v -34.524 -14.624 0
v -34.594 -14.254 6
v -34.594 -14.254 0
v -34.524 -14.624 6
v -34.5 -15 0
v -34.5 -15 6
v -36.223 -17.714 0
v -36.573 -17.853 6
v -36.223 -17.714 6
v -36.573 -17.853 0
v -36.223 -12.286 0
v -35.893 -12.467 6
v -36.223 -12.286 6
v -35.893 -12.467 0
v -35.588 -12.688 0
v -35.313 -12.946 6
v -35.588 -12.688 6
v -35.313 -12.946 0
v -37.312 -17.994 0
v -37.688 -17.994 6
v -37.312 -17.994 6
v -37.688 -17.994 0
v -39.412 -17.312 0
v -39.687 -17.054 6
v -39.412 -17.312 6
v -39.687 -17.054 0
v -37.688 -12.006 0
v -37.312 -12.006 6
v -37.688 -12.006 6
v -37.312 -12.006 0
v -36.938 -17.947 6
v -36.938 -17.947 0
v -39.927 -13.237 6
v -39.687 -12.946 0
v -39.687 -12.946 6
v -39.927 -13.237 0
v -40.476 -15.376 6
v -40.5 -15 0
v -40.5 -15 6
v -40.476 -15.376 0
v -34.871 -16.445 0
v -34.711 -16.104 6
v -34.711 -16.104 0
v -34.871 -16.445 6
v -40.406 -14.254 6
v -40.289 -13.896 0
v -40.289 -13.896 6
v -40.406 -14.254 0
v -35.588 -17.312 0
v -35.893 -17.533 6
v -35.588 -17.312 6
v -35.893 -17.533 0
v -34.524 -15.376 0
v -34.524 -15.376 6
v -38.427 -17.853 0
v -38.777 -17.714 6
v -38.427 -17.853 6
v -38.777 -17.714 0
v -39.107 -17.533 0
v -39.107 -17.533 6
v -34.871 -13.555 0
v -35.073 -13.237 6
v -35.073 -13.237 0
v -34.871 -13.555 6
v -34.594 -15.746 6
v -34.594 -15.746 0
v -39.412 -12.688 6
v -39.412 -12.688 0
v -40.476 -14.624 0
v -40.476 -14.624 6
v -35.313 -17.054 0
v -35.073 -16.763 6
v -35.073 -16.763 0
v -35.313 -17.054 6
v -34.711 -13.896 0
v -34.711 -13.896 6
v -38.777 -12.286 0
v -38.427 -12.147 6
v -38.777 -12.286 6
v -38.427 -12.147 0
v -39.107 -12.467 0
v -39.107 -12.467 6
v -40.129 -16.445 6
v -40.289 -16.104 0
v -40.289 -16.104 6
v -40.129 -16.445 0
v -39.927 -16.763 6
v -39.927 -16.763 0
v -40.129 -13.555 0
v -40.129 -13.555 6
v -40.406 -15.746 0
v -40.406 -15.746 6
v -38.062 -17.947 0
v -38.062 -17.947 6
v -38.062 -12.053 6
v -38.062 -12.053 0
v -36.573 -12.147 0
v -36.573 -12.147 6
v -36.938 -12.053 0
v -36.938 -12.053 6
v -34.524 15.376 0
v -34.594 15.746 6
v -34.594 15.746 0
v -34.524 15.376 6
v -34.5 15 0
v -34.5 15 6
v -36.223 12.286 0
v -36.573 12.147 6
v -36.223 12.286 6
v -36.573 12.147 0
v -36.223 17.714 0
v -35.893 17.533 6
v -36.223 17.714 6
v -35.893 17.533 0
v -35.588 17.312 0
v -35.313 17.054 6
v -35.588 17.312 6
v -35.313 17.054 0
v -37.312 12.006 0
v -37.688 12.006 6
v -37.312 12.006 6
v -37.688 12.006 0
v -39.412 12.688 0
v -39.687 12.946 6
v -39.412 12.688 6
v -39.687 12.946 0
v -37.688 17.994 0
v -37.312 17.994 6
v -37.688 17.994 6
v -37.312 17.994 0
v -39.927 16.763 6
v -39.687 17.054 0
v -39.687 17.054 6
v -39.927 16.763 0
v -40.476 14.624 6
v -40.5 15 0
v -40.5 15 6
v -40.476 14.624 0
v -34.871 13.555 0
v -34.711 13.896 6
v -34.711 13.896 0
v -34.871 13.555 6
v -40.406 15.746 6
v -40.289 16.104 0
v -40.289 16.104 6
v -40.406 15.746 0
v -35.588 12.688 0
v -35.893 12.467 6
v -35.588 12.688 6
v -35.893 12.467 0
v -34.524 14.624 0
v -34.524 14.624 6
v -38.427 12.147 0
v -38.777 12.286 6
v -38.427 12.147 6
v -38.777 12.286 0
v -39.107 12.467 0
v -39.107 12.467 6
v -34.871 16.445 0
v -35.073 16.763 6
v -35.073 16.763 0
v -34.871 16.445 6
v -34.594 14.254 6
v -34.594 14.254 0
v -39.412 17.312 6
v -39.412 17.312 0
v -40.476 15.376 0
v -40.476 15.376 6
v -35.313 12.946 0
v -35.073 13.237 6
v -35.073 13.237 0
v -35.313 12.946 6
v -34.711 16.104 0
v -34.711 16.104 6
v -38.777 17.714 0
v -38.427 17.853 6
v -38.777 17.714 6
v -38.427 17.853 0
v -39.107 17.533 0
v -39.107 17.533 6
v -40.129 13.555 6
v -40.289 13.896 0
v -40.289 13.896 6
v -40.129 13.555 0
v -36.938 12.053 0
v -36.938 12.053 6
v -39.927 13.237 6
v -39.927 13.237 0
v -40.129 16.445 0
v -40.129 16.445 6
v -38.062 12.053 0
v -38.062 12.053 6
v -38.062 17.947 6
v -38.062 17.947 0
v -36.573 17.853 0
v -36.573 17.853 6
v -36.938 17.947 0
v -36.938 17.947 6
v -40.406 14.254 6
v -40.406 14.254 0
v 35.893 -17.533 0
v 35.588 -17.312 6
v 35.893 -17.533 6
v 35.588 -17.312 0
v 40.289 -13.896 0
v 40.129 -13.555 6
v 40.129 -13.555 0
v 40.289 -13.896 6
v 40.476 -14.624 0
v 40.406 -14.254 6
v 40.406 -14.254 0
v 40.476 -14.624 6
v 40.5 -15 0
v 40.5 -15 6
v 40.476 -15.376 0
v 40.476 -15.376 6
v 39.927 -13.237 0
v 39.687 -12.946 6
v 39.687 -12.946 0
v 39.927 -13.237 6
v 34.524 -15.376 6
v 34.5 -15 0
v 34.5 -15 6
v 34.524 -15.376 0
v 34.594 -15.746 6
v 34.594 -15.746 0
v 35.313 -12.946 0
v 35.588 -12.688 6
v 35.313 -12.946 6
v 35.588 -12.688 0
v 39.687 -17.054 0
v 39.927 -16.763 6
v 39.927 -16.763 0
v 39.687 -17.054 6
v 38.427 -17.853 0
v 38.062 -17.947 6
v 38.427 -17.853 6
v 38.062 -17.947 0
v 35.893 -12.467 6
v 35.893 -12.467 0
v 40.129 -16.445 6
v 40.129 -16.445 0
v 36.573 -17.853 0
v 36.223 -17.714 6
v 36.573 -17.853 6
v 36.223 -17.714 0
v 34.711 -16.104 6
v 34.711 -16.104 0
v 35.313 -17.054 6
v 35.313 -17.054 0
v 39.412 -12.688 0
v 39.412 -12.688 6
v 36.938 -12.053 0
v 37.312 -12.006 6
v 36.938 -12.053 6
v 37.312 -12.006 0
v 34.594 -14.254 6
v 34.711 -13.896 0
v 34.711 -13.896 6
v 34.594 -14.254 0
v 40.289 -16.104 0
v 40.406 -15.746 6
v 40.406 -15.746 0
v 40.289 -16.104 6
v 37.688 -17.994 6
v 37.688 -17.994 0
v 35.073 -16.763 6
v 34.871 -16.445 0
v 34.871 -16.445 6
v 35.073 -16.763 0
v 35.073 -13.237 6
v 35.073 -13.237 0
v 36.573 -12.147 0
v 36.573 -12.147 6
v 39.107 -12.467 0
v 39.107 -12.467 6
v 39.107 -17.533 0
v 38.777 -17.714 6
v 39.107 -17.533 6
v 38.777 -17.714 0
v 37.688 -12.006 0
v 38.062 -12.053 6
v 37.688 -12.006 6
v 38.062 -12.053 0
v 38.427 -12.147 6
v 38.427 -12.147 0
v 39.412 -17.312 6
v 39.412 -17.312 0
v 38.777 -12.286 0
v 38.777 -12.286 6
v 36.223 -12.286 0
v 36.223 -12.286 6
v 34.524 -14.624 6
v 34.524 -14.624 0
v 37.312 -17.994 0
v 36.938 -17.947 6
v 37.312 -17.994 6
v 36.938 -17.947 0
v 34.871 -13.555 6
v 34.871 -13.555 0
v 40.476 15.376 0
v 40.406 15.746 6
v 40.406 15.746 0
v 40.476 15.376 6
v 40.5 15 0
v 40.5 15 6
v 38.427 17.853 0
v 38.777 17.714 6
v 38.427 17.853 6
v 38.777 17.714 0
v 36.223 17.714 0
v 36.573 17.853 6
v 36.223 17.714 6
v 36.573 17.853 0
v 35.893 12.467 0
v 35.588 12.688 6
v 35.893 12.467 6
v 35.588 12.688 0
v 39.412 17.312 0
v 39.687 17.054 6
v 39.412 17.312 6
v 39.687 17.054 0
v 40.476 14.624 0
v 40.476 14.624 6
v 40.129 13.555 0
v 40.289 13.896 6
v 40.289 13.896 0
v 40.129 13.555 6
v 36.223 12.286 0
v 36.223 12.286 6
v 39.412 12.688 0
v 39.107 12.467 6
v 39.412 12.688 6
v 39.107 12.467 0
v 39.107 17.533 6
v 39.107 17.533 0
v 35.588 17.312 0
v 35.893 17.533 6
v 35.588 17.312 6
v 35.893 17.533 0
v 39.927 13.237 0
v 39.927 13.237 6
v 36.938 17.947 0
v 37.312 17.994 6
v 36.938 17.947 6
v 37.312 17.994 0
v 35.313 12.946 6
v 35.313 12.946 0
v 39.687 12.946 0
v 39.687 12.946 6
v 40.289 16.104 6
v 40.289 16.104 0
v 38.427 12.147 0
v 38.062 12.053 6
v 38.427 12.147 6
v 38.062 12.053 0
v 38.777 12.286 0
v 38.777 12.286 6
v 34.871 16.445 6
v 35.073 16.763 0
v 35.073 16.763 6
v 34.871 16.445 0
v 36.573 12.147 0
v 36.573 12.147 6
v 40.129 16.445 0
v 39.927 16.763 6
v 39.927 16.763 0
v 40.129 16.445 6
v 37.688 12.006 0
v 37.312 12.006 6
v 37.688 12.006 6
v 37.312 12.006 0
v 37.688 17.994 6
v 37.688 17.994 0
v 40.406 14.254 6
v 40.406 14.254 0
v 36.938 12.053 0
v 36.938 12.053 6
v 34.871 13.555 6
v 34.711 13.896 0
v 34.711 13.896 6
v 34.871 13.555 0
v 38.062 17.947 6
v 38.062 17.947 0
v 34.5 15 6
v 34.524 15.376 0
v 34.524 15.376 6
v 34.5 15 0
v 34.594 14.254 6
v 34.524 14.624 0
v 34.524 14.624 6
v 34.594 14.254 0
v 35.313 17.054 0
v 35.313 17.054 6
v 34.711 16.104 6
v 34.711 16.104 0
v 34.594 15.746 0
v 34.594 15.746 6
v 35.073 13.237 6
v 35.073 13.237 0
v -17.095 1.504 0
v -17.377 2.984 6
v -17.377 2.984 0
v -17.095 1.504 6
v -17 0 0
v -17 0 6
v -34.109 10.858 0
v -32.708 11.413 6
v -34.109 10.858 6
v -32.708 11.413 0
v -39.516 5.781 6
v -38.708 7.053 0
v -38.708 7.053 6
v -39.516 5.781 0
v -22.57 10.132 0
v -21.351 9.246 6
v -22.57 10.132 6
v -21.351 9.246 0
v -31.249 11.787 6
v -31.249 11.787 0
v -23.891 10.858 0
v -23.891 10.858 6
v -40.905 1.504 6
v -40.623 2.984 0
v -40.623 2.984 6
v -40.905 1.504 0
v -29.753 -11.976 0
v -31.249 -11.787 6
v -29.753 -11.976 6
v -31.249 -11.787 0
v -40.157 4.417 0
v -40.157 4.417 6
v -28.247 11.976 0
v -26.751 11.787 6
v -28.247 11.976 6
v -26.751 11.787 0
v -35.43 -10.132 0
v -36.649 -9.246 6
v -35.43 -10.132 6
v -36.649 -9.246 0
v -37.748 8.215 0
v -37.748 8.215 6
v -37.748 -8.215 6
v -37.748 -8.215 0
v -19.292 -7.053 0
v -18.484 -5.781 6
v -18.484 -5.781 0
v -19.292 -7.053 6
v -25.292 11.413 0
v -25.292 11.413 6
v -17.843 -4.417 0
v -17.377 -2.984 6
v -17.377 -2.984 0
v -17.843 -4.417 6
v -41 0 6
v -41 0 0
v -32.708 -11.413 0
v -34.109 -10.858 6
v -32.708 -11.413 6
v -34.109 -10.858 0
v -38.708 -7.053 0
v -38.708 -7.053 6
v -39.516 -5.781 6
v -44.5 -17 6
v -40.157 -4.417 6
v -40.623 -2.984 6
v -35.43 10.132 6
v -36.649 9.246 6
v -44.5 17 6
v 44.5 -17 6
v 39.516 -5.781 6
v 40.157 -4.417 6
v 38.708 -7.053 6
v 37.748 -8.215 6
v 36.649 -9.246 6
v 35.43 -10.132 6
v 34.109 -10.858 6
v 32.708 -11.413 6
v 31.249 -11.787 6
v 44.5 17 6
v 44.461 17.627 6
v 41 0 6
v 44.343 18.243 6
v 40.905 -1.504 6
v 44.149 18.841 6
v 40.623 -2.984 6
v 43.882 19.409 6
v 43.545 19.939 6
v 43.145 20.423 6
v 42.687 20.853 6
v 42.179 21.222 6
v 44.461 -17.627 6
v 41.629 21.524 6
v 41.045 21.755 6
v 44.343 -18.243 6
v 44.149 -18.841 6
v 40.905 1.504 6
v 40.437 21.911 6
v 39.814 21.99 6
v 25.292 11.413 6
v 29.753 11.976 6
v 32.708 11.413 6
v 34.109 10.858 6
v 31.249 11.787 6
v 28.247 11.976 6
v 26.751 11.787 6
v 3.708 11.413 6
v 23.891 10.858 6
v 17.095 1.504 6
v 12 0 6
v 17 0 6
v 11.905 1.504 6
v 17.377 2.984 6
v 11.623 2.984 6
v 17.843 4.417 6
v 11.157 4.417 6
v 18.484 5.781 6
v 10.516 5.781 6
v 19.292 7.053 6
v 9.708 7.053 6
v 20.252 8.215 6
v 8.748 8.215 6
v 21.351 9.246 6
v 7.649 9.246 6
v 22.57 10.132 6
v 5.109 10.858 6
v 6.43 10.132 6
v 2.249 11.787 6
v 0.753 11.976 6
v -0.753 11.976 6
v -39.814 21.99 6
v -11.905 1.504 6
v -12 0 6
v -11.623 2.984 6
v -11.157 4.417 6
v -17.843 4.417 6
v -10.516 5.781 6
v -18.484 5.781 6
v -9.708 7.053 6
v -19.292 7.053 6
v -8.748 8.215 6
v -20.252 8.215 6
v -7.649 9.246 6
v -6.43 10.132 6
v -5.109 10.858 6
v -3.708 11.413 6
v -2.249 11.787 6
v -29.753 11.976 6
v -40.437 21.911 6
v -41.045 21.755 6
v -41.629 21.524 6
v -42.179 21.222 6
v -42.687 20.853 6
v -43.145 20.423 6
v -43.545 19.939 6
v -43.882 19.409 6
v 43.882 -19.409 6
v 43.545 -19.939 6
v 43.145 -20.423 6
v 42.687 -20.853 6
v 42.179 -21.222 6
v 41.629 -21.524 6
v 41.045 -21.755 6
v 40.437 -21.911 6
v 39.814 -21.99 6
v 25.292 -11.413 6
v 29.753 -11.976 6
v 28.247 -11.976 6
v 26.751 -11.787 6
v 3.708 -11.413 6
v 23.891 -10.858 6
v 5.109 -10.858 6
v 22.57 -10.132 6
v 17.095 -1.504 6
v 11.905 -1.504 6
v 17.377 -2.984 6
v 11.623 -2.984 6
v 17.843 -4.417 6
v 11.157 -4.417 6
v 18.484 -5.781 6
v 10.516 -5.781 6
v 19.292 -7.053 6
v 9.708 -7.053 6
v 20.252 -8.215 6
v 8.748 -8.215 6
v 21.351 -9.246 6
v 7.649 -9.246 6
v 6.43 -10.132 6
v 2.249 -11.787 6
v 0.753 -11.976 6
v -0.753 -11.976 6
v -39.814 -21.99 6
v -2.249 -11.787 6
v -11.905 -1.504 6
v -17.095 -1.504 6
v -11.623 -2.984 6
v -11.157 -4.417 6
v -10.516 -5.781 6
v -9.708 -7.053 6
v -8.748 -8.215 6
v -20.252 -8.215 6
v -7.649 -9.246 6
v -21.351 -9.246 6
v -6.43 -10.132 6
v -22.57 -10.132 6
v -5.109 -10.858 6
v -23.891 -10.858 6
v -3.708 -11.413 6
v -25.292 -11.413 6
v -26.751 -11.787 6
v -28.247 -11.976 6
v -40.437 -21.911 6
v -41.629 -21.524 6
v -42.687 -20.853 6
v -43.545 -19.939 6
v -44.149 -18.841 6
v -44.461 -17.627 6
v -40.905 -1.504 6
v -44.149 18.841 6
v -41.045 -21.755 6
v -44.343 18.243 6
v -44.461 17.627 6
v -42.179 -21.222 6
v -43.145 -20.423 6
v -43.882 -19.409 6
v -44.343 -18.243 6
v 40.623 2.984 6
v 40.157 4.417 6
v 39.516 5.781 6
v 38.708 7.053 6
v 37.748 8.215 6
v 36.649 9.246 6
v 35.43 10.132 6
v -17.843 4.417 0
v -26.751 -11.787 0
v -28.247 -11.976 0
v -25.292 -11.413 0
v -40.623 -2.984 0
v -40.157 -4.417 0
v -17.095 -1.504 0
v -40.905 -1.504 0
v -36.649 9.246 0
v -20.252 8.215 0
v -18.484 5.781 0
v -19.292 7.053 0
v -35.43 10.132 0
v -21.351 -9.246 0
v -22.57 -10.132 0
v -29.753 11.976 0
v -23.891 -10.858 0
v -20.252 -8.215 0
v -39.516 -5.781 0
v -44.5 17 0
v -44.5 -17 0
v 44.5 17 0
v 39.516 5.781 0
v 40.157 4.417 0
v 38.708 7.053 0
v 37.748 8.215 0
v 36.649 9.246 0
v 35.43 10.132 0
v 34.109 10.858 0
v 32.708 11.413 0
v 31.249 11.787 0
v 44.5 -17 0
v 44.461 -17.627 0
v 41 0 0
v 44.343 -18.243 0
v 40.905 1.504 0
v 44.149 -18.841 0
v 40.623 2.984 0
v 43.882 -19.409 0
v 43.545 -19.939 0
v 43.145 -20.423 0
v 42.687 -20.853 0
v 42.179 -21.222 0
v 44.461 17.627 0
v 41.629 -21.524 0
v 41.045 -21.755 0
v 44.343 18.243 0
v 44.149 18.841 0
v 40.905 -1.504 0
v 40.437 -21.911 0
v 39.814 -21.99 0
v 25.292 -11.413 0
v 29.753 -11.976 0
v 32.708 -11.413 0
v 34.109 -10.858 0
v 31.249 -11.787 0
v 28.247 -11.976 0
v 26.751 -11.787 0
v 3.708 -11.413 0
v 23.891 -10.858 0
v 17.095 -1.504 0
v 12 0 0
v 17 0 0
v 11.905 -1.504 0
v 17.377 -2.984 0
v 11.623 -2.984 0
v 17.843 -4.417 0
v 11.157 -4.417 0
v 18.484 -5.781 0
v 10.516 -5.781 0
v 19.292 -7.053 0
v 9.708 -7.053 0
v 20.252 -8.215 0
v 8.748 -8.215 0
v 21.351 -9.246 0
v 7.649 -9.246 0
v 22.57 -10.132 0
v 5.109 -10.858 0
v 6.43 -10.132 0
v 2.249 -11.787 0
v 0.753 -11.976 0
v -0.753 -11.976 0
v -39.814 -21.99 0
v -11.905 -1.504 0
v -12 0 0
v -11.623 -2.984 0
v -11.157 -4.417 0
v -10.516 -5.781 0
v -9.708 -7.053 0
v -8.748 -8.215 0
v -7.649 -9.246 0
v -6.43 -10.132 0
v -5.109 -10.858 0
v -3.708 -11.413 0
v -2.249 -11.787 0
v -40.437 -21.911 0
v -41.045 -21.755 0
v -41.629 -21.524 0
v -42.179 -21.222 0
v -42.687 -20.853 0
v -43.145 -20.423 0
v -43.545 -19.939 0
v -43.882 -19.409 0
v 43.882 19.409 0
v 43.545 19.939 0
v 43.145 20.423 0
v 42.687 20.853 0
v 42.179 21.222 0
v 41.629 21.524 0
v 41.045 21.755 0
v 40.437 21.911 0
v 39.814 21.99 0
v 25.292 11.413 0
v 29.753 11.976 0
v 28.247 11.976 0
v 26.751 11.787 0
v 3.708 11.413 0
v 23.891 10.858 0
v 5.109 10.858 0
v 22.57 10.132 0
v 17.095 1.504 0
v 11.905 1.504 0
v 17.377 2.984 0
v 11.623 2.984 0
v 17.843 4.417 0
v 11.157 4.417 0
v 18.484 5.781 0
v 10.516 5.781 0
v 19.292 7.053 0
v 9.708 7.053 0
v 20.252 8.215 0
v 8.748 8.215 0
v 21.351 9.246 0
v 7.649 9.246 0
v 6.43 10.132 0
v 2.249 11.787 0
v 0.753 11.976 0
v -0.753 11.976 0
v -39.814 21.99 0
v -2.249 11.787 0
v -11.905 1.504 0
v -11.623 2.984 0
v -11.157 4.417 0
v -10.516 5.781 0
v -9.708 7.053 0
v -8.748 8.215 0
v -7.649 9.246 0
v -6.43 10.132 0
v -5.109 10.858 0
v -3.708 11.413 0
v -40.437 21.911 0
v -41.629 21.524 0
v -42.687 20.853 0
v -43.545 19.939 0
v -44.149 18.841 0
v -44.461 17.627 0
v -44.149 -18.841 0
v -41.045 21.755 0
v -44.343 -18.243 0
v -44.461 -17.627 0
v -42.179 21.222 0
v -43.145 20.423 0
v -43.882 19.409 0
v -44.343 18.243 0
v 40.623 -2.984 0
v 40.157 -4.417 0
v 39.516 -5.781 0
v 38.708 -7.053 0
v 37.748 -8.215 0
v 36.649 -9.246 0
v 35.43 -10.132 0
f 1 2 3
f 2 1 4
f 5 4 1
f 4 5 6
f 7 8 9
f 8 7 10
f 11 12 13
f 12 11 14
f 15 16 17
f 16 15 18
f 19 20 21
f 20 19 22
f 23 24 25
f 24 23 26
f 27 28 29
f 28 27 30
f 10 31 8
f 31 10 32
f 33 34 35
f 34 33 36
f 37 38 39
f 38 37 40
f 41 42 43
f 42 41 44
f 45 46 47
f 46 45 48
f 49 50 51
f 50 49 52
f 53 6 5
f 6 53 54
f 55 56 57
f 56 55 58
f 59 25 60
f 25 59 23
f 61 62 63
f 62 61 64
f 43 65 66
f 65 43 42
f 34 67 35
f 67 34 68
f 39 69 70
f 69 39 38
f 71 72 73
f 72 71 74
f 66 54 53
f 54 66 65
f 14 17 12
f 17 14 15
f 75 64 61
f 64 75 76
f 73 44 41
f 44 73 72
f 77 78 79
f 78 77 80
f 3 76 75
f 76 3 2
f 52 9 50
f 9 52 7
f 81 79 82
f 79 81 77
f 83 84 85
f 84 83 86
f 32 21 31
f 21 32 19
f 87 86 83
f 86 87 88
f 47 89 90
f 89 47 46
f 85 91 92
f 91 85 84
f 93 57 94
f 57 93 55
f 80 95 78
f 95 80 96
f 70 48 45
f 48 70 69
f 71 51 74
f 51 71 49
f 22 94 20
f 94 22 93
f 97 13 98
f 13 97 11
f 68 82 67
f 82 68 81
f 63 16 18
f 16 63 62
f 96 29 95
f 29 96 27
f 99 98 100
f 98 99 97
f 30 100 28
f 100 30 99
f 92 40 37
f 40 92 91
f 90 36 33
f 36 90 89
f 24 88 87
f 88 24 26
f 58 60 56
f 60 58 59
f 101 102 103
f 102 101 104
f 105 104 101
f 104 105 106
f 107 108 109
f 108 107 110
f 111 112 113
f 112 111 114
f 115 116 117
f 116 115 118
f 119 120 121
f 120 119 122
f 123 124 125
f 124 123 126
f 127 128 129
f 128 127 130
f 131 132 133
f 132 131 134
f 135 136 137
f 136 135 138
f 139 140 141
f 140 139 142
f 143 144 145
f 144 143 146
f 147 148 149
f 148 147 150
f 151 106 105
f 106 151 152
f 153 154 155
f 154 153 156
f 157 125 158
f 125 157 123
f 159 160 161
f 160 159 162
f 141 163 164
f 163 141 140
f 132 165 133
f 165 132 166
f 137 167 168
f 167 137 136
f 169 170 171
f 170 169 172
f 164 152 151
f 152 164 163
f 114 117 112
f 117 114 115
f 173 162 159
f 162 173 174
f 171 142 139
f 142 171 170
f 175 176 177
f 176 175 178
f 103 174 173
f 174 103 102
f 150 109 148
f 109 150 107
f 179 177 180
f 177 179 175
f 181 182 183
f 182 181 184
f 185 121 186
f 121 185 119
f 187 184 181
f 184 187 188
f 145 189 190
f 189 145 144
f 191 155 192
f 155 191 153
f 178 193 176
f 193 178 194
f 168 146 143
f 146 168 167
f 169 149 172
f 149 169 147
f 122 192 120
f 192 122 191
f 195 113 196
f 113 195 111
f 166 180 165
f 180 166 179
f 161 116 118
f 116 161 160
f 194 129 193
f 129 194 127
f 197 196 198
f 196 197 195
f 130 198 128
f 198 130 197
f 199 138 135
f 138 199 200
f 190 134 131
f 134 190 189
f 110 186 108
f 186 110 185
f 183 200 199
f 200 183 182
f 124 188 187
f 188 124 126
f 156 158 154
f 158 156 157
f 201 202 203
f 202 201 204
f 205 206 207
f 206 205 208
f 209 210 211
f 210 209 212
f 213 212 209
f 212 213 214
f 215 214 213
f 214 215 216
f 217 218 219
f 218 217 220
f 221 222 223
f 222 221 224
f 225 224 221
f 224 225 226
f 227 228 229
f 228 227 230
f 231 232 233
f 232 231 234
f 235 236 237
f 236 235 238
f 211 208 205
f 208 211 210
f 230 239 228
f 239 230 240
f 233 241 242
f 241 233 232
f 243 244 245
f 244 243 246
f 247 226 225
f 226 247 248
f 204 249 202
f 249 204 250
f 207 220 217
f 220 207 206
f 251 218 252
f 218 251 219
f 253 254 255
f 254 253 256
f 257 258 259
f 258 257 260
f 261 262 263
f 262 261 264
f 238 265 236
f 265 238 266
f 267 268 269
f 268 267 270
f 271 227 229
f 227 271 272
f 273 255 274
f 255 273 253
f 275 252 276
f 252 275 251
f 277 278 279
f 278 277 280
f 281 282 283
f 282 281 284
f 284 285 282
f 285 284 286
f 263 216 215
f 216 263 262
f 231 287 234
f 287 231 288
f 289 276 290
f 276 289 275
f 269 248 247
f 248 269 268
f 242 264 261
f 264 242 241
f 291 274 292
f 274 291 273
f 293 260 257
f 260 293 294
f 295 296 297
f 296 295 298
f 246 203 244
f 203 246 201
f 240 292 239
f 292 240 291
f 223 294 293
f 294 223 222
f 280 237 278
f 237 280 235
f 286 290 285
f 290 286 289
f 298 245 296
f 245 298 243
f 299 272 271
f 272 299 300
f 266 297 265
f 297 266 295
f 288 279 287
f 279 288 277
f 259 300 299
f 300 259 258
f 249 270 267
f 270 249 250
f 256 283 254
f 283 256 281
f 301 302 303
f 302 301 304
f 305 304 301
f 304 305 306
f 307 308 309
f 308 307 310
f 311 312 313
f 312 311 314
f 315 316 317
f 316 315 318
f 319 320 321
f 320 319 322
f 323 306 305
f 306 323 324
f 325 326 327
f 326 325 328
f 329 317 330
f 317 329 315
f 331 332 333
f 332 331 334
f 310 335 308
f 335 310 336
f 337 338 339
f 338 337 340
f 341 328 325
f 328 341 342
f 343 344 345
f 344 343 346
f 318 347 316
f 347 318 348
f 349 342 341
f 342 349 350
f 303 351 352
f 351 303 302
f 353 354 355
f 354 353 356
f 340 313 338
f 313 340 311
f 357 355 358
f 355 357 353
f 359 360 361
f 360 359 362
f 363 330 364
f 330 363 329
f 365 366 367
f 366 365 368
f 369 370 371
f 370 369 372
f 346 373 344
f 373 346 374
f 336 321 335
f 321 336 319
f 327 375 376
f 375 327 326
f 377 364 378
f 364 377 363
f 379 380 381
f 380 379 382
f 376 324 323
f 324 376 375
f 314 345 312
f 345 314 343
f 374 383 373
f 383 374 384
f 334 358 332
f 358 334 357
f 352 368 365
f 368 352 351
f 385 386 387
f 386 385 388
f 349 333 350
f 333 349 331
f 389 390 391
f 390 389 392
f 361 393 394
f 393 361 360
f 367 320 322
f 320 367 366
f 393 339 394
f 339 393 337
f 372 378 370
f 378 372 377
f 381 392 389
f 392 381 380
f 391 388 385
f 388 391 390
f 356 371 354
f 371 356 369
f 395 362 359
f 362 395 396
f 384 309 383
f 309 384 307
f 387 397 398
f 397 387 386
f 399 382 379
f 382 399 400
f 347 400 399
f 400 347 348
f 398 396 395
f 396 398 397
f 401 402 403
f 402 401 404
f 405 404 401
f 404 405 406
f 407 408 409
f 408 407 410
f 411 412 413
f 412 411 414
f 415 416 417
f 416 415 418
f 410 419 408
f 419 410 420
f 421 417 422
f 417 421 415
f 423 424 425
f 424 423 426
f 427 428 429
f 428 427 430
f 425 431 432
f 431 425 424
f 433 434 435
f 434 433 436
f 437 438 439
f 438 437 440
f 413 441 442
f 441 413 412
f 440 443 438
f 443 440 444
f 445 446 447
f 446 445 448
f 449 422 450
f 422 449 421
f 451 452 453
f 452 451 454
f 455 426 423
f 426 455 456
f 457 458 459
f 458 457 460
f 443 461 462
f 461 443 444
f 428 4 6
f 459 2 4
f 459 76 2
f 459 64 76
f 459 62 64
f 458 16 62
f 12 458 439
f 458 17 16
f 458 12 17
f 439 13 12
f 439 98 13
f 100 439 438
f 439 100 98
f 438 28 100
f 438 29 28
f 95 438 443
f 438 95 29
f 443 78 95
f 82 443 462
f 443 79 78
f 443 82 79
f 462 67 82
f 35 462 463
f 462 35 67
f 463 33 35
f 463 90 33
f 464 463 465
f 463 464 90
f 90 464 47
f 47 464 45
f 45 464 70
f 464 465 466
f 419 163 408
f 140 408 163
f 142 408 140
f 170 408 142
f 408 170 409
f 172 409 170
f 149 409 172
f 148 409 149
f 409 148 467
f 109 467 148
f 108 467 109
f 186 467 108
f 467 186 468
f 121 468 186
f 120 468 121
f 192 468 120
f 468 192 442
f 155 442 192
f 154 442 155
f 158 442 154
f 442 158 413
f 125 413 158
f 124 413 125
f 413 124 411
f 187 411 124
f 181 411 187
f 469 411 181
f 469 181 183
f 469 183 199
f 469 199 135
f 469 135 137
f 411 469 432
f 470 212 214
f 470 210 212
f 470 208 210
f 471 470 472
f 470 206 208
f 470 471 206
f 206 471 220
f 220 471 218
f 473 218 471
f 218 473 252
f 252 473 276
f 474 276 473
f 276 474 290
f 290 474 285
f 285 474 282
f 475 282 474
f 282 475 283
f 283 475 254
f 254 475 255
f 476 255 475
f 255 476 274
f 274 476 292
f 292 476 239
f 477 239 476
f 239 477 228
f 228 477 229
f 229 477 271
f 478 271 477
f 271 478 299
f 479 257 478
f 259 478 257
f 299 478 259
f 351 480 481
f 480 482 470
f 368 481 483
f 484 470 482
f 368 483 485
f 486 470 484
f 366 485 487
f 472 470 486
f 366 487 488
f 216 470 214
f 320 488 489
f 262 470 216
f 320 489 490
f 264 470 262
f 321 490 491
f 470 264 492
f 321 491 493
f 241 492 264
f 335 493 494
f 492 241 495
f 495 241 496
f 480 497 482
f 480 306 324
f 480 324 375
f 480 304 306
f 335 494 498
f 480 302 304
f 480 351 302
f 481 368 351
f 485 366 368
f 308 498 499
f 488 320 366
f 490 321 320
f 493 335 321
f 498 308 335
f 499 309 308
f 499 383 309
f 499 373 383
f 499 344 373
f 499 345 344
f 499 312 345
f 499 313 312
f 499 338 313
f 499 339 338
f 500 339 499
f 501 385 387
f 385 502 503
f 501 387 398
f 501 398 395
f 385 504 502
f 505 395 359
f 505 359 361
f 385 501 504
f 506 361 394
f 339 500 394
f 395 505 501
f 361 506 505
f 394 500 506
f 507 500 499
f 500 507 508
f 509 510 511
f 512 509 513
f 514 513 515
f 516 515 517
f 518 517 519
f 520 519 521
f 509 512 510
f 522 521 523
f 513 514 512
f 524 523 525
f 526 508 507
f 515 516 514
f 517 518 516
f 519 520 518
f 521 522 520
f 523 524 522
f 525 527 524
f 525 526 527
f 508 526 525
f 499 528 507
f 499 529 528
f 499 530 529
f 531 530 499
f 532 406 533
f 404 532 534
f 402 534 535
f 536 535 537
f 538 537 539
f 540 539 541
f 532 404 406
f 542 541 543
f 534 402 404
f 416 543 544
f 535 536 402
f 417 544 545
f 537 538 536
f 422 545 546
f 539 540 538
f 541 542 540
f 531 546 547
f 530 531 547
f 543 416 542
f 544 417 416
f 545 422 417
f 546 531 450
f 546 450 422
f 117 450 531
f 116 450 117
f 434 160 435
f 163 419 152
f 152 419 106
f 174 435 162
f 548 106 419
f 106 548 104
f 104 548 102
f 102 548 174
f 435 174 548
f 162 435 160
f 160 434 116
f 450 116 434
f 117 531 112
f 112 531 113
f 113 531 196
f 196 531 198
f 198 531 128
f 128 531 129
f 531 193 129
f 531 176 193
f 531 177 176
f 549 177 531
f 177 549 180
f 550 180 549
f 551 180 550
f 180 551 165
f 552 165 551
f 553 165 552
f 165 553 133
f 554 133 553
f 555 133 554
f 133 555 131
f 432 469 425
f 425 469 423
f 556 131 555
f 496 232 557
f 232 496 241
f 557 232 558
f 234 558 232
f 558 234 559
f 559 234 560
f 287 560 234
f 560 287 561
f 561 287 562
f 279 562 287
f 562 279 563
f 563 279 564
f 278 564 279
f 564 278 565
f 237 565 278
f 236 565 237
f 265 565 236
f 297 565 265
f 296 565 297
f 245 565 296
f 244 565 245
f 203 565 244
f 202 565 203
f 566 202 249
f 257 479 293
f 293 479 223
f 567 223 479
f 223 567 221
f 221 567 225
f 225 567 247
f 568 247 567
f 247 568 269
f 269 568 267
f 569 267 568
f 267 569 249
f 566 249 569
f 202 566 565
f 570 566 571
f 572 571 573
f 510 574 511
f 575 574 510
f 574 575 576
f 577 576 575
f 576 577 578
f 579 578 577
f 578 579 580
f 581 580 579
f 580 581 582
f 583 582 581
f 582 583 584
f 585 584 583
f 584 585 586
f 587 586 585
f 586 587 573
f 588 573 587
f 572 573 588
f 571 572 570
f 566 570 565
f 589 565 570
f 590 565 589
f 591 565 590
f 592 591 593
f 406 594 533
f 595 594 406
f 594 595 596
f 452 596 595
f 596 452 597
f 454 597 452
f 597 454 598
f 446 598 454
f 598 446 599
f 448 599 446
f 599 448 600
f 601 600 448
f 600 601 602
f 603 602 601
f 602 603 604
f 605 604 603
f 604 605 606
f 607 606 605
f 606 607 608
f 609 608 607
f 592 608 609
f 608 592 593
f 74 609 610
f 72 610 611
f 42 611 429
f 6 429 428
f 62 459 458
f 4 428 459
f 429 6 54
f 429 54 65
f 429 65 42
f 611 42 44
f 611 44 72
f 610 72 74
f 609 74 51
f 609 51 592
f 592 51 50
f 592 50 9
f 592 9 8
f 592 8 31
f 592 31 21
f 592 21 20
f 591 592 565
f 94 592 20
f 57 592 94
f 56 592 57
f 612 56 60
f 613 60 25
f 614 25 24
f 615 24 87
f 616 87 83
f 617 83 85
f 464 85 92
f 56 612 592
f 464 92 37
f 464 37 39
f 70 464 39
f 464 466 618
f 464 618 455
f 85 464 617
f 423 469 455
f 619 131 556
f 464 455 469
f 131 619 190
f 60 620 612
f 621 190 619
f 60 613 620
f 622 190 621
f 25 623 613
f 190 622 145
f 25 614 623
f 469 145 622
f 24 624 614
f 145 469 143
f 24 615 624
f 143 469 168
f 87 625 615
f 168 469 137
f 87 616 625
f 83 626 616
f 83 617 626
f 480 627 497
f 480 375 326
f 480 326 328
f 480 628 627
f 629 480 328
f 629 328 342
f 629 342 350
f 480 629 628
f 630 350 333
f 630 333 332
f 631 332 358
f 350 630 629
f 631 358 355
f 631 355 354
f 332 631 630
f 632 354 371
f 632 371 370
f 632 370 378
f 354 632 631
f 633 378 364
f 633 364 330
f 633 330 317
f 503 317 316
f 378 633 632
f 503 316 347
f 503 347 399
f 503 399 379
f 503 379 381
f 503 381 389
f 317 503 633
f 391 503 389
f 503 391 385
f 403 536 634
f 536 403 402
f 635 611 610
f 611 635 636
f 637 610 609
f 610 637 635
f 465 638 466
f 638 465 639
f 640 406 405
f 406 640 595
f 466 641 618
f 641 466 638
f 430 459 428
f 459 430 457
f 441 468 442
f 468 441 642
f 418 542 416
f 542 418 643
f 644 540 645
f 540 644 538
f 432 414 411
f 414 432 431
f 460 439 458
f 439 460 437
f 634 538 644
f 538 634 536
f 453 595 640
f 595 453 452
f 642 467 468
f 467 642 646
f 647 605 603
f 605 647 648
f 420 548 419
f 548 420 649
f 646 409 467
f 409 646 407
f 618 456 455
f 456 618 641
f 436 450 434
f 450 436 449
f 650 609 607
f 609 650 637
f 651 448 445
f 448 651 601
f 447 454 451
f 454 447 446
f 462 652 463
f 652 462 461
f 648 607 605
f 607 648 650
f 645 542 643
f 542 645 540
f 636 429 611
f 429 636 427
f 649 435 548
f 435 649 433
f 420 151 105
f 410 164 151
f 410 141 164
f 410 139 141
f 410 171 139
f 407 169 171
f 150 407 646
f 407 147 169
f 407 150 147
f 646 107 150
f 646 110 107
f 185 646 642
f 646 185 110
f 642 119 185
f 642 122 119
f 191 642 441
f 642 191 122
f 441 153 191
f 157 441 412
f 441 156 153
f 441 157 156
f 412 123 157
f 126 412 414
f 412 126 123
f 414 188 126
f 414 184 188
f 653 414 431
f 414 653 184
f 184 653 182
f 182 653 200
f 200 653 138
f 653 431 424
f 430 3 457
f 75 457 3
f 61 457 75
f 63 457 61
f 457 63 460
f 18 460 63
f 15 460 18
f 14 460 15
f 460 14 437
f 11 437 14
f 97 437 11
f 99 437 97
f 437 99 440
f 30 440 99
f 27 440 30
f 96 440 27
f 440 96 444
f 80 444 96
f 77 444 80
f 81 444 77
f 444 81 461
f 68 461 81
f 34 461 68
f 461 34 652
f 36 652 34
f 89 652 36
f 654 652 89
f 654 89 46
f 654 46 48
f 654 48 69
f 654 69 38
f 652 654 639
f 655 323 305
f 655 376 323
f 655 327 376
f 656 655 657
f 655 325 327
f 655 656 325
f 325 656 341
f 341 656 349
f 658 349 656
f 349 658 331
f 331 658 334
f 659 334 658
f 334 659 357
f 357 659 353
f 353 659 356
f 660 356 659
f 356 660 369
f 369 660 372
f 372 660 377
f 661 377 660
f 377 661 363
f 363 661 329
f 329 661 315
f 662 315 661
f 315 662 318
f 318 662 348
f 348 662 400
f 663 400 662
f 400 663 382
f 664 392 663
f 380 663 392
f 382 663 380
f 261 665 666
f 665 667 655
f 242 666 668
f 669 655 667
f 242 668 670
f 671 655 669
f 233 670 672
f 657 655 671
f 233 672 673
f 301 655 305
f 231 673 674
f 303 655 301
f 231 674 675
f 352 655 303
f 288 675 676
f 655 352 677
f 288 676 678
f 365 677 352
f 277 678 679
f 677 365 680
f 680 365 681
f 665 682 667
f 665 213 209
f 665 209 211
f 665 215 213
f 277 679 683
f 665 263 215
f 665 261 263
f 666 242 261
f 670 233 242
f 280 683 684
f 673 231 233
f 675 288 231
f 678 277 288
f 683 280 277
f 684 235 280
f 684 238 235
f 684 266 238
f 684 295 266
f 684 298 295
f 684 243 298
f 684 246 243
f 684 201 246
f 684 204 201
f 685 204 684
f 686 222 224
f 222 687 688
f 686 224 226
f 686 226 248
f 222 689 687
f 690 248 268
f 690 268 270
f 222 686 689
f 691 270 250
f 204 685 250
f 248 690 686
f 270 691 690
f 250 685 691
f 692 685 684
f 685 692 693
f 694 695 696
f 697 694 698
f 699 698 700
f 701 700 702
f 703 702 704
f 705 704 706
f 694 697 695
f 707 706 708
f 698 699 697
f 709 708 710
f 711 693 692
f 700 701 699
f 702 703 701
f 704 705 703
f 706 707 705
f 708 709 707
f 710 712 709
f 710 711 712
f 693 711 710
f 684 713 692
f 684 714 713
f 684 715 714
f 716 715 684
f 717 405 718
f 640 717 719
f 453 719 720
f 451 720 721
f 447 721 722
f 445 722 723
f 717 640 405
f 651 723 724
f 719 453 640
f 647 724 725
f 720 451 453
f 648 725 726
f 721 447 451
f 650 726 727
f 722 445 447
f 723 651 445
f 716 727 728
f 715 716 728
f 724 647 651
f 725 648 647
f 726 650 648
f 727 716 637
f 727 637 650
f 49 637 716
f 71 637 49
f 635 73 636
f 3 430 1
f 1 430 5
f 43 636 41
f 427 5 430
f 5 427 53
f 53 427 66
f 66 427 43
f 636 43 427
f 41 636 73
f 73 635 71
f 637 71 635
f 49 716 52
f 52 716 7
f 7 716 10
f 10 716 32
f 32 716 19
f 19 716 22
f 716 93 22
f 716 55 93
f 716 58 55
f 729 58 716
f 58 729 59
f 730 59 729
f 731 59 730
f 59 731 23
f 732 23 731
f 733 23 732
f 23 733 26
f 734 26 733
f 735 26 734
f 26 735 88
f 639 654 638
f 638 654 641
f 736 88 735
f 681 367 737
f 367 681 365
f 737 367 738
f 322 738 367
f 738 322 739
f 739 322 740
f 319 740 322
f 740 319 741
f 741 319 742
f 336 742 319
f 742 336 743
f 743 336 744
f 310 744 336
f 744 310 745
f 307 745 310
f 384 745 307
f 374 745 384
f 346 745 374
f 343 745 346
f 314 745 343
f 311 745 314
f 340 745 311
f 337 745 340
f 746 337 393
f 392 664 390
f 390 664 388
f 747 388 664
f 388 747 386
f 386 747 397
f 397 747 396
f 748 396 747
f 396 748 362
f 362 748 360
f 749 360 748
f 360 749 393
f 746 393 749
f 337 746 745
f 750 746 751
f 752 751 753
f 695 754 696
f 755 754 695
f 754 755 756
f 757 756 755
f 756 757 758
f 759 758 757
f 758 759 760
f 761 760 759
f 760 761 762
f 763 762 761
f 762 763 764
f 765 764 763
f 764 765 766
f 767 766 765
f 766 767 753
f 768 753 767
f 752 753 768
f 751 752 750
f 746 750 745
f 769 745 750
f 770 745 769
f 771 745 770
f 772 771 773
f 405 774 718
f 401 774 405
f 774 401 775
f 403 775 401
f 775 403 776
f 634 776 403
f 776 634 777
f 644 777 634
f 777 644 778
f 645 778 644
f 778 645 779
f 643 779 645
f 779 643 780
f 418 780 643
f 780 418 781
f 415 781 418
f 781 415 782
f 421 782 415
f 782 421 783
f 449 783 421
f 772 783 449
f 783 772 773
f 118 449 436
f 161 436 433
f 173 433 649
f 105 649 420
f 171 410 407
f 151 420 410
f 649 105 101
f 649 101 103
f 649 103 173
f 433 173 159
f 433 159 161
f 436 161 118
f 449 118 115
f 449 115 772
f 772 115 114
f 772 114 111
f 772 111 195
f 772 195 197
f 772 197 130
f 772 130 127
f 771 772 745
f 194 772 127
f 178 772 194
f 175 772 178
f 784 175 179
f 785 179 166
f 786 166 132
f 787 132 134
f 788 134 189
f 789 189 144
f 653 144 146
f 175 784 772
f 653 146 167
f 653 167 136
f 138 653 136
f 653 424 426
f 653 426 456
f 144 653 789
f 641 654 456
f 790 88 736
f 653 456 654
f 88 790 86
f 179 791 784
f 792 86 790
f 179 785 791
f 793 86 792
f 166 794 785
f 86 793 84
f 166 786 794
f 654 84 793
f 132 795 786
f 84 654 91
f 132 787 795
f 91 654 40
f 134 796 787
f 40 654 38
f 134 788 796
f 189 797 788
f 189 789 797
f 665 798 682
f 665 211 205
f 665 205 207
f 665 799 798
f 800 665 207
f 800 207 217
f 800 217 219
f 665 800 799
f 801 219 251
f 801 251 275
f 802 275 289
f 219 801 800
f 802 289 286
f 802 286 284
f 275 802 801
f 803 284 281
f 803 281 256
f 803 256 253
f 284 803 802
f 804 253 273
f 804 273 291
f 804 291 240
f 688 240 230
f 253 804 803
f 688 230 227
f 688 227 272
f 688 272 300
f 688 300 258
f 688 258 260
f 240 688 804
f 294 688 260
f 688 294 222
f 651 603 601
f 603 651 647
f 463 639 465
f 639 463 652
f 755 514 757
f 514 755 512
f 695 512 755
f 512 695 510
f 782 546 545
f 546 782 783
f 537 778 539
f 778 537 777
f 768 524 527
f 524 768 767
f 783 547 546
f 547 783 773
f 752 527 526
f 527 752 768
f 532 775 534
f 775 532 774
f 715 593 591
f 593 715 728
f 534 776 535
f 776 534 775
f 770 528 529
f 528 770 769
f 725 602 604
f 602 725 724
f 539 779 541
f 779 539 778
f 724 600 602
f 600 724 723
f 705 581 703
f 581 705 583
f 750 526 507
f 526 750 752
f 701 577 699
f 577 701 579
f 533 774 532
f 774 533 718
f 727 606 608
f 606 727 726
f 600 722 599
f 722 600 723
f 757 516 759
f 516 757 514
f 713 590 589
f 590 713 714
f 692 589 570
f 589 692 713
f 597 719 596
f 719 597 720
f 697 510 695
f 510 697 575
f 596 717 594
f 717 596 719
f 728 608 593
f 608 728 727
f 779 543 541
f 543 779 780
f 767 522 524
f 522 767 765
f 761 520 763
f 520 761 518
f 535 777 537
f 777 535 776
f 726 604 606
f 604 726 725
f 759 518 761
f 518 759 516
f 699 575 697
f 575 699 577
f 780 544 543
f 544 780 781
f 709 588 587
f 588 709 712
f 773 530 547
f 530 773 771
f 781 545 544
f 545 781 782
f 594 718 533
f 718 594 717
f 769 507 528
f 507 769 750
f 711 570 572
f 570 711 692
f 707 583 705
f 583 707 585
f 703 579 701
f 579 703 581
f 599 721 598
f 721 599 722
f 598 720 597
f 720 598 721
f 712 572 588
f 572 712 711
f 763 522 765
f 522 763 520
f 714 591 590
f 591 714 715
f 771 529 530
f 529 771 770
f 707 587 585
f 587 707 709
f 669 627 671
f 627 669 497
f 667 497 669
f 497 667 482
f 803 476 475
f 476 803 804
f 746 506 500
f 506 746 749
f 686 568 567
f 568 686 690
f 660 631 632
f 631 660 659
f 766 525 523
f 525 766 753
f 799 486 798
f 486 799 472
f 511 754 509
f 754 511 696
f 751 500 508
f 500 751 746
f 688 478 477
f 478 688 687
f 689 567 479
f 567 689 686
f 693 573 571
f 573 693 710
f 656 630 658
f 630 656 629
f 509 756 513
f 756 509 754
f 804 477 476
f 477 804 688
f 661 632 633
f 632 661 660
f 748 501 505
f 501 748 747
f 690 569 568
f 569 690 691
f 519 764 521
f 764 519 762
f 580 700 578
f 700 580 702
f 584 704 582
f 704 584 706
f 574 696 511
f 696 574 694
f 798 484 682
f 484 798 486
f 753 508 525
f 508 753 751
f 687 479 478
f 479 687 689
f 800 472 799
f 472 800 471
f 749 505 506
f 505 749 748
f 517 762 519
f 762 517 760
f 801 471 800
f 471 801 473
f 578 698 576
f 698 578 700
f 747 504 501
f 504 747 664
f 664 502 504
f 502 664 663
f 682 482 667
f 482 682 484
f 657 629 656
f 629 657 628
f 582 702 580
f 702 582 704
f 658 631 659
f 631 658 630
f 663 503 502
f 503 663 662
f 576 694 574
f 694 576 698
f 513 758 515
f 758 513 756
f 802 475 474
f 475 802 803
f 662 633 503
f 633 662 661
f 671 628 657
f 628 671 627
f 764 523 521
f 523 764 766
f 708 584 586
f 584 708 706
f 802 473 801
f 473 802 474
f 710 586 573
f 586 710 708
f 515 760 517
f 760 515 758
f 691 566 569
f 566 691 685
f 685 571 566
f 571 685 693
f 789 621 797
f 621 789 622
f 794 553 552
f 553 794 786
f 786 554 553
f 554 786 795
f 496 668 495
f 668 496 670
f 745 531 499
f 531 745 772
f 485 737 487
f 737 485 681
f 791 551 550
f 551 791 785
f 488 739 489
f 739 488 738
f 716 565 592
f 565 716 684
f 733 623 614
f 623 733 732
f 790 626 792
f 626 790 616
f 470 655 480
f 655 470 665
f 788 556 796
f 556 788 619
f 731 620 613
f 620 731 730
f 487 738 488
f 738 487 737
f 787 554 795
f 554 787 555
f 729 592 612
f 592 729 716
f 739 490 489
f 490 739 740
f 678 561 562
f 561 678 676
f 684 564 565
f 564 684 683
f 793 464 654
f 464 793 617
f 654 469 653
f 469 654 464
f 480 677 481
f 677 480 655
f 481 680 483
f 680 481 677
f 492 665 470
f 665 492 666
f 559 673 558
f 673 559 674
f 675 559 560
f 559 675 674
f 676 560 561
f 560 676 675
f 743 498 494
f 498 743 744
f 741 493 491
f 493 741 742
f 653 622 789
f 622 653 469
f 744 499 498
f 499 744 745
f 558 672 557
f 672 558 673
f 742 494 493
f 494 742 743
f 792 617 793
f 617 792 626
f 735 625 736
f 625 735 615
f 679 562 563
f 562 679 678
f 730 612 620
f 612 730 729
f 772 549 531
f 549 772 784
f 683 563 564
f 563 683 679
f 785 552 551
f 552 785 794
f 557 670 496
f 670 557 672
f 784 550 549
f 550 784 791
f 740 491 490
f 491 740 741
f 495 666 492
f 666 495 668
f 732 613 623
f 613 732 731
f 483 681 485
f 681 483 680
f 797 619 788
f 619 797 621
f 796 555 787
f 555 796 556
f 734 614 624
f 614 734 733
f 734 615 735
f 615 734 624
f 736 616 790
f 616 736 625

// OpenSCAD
$fn = 50;


difference() {
	union() {
		hull() {
			translate(v = [-39.5000000000, 17.0000000000, 0]) {
				cylinder(h = 6, r = 5);
			}
			translate(v = [39.5000000000, 17.0000000000, 0]) {
				cylinder(h = 6, r = 5);
			}
			translate(v = [-39.5000000000, -17.0000000000, 0]) {
				cylinder(h = 6, r = 5);
			}
			translate(v = [39.5000000000, -17.0000000000, 0]) {
				cylinder(h = 6, r = 5);
			}
		}
	}
	union() {
		#translate(v = [-37.5000000000, -15.0000000000, -100.0000000000]) {
			cylinder(h = 200, r = 3.0000000000);
		}
		#translate(v = [-37.5000000000, 15.0000000000, -100.0000000000]) {
			cylinder(h = 200, r = 3.0000000000);
		}
		#translate(v = [37.5000000000, -15.0000000000, -100.0000000000]) {
			cylinder(h = 200, r = 3.0000000000);
		}
		#translate(v = [37.5000000000, 15.0000000000, -100.0000000000]) {
			cylinder(h = 200, r = 3.0000000000);
		}
		#translate(v = [-29.0000000000, 0, 0]) {
			cylinder(h = 6, r = 12.0000000000);
		}
		#cylinder(h = 6, r = 12.0000000000);
		#translate(v = [29.0000000000, 0, 0]) {
			cylinder(h = 6, r = 12.0000000000);
		}
	}
}
